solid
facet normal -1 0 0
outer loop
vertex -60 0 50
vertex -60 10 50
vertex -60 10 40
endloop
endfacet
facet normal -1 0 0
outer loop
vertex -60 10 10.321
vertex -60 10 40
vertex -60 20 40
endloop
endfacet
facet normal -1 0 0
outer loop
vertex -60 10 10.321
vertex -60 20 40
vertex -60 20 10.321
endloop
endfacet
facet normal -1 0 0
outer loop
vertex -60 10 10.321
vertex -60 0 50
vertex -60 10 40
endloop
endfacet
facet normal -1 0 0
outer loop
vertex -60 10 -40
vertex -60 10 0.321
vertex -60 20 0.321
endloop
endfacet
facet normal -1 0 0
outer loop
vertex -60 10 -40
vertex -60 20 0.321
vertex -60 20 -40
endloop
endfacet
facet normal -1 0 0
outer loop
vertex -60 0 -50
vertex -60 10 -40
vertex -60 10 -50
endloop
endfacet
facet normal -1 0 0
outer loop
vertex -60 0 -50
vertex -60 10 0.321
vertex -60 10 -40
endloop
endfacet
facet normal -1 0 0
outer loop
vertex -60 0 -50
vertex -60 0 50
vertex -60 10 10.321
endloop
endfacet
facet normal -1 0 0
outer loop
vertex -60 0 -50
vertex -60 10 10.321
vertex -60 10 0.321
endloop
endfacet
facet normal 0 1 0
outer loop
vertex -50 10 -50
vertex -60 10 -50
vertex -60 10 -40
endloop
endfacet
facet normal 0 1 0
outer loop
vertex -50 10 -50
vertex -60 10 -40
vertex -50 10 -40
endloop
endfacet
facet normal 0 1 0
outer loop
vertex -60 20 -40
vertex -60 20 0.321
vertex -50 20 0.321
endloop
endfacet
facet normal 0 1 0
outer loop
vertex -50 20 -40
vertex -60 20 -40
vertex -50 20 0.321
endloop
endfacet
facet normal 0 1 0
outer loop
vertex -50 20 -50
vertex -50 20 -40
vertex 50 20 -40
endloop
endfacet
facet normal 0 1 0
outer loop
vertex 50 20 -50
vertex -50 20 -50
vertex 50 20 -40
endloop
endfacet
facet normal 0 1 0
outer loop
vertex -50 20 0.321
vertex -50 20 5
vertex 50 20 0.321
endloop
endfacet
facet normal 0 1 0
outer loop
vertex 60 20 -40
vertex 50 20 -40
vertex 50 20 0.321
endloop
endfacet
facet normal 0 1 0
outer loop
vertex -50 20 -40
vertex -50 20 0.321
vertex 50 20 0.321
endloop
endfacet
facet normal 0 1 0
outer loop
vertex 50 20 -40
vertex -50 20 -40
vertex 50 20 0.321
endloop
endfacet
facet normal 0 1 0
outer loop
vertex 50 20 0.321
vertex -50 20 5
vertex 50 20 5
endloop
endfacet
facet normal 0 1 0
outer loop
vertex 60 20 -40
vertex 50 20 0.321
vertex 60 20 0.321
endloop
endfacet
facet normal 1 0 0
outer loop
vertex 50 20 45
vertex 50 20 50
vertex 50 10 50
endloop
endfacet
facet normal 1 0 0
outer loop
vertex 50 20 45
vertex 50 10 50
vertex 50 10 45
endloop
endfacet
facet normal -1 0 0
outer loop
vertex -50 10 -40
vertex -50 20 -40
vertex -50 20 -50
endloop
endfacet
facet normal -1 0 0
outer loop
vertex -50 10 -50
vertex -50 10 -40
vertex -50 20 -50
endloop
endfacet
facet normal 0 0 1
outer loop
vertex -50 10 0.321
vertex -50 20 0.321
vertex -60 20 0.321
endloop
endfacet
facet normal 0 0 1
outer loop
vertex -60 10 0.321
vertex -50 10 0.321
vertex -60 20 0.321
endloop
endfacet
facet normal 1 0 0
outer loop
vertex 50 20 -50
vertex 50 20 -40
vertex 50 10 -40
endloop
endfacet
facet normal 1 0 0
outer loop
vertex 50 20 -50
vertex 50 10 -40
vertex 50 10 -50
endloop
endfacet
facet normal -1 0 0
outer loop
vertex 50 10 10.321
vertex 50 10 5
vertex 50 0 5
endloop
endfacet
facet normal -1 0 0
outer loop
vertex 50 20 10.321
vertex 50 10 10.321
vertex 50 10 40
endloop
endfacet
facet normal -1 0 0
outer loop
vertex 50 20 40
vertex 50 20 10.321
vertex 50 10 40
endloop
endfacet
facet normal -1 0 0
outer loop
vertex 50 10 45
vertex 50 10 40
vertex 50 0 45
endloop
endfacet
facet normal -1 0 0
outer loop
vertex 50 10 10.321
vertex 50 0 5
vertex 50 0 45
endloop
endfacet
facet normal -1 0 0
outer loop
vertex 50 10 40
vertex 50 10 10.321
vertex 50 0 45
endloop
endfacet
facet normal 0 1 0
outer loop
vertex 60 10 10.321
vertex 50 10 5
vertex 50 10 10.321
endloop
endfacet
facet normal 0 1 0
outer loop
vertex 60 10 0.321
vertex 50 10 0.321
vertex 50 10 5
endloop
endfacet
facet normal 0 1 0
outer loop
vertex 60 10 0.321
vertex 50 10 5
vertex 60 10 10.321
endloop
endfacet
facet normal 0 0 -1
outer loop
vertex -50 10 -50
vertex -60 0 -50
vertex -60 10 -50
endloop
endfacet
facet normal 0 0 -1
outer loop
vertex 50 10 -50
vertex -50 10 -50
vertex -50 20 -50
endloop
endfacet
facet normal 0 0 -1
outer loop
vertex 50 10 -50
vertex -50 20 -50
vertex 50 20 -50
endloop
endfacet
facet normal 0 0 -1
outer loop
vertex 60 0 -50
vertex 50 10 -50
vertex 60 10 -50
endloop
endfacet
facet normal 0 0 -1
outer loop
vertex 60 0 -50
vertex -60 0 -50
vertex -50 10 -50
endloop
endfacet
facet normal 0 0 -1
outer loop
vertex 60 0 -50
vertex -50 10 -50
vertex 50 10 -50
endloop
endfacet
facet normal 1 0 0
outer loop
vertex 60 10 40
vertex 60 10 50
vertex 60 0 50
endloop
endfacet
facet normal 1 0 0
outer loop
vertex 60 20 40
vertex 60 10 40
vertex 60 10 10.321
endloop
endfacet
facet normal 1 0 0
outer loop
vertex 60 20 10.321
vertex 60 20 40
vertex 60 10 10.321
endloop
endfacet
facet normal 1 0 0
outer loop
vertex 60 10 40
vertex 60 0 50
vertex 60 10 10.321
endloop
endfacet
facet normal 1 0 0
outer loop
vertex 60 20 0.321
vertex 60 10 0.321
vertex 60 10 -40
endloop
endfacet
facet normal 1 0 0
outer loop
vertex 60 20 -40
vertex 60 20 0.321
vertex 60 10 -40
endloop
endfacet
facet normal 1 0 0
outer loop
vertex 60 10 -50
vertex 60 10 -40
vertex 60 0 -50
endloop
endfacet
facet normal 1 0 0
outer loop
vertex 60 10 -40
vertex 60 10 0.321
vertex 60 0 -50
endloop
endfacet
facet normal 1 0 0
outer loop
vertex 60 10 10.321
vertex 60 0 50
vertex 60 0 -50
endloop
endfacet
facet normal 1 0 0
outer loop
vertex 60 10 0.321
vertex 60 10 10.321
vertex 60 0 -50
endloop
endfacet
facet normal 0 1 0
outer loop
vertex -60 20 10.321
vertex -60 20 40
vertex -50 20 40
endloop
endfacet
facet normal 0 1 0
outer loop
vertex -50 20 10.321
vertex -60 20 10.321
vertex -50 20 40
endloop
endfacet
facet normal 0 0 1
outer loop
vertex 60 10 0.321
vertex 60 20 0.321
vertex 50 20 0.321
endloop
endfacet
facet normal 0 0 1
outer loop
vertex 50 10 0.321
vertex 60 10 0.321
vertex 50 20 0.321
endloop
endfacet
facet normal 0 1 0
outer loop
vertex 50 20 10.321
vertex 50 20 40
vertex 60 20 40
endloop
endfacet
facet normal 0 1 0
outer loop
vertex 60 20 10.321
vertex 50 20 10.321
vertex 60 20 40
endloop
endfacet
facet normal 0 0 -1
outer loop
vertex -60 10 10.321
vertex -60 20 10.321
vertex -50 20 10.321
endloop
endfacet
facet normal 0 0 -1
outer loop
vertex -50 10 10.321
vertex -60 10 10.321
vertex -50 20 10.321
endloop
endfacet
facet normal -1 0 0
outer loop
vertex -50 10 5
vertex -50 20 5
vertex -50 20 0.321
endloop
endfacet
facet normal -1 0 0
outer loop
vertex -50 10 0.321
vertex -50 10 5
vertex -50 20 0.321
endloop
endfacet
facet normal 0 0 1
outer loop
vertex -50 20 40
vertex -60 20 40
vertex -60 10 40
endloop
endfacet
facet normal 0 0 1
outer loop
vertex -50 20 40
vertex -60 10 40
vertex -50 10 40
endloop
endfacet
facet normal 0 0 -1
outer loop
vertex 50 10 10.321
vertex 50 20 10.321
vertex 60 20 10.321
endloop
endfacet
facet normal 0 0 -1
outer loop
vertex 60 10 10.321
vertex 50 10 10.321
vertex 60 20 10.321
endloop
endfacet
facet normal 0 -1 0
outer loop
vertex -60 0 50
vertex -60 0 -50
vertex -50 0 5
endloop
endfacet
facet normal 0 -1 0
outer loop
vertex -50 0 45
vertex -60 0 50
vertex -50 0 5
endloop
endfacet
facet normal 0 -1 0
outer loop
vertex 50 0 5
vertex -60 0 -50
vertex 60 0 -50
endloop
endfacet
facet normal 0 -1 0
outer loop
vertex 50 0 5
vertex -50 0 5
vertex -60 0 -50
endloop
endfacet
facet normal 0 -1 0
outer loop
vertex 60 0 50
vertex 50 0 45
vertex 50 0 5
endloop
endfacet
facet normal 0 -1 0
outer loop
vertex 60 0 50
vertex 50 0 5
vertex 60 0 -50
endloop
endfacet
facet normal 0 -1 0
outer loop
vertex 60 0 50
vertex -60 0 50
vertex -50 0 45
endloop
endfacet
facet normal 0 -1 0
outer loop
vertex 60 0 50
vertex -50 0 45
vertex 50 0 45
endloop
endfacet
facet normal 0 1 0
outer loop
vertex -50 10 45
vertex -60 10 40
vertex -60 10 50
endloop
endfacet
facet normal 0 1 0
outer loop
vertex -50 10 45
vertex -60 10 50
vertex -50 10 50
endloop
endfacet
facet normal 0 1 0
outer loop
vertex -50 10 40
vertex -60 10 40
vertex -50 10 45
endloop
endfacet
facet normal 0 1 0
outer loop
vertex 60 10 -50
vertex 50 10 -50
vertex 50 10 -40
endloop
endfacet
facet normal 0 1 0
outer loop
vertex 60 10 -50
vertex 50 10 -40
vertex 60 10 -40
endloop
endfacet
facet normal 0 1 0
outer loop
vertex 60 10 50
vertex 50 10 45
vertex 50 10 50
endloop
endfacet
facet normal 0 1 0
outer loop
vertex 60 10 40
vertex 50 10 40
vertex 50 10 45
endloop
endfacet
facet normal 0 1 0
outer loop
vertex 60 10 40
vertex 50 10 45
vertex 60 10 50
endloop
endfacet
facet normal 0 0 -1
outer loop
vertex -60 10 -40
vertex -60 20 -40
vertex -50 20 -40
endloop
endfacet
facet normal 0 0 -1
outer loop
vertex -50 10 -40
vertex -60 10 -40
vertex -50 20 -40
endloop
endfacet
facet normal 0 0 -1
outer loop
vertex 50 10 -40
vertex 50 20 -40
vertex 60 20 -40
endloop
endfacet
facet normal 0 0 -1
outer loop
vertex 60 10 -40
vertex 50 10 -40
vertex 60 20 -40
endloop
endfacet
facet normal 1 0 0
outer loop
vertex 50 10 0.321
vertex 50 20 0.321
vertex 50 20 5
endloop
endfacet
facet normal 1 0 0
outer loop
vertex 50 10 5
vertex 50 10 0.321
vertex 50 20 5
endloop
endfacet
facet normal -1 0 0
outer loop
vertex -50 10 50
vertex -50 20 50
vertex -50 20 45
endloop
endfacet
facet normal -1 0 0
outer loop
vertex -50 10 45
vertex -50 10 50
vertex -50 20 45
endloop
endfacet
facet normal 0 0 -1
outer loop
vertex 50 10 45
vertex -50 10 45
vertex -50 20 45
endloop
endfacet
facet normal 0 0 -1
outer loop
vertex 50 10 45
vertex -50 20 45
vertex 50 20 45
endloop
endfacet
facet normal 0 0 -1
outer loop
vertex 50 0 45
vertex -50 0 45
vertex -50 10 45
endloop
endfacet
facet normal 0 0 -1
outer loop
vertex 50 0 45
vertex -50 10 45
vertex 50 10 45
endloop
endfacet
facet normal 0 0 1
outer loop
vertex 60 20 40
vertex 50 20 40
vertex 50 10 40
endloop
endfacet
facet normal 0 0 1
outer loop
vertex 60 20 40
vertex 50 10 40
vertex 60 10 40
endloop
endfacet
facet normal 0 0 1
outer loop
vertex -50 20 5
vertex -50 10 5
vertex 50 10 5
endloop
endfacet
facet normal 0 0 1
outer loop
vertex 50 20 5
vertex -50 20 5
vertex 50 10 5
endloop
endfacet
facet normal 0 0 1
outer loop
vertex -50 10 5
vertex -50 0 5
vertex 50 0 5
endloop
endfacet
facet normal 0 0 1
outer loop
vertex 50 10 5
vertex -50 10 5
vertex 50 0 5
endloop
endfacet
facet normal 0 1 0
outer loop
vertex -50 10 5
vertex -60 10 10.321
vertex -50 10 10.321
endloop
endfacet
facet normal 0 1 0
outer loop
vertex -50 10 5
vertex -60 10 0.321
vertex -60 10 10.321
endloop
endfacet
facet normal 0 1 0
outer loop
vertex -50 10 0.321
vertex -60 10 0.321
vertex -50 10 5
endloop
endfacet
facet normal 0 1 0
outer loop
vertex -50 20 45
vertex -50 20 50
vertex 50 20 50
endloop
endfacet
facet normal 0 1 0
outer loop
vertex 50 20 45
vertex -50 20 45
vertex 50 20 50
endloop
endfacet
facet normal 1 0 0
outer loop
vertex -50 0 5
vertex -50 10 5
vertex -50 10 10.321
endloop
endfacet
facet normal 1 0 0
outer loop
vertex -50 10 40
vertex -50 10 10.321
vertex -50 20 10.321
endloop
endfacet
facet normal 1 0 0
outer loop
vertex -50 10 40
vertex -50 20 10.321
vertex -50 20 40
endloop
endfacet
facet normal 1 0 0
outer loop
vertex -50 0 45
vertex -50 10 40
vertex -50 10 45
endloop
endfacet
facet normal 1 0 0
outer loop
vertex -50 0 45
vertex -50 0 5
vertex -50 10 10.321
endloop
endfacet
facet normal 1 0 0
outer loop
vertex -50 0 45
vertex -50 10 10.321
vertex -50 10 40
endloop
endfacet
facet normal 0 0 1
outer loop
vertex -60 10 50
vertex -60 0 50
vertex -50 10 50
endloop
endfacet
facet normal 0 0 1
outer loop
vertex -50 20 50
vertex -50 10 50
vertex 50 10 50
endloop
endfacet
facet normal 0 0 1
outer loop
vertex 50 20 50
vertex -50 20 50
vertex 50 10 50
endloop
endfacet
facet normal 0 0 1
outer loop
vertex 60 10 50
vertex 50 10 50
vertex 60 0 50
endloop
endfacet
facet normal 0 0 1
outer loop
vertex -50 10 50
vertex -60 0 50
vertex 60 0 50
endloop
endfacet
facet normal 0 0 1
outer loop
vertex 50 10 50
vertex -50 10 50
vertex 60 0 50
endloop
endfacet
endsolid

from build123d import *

# Parameters (mm, degrees)
SKETCH1_W           = 120
SKETCH1_H           = 100
BOSS_EXTRUDE1_DEPTH = 20
SKETCH6_W           = 110
SKETCH6_H           = 40
CUT_EXTRUDE1_DEPTH  = 20
SKETCH6_3_W         = 5
SKETCH6_3_H         = 40
BOSS_EXTRUDE4_DEPTH = 20
SKETCH14_W          = 10
SKETCH14_H          = 10
CUT_EXTRUDE2_DEPTH  = 10
SKETCH15_W          = 10
SKETCH15_H          = 10
CUT_EXTRUDE3_DEPTH  = 10


with BuildPart() as part:
    # Sketch1 → Boss-Extrude1 (new body)
    with BuildSketch(Plane(origin=(0, 0, 0), x_dir=(1, 0, 0), z_dir=(0, 1, 0))):
        Rectangle(SKETCH1_W, SKETCH1_H)
    extrude(amount=BOSS_EXTRUDE1_DEPTH)

    # Sketch6 → Cut-Extrude1 (cut)
    with BuildSketch(Plane.XZ):
        with Locations((0, 25)):
            Rectangle(SKETCH6_W, SKETCH6_H)
    extrude(amount=-CUT_EXTRUDE1_DEPTH, mode=Mode.SUBTRACT)

    # Sketch6<3> → Boss-Extrude4 (add)
    with BuildSketch(Plane.XZ):
        with Locations((-52.5, 25)):
            Rectangle(SKETCH6_3_W, SKETCH6_3_H)
        with Locations((52.5, 25)):
            Rectangle(SKETCH6_3_W, SKETCH6_3_H)
    extrude(amount=-BOSS_EXTRUDE4_DEPTH)

    # Sketch14 → Cut-Extrude2 (cut)
    with BuildSketch(Plane(origin=(0, 20, 0), x_dir=(1, 0, 0), z_dir=(0, 1, 0))):
        with Locations((55, -5.320888862)):
            Rectangle(SKETCH14_W, SKETCH14_H)
        with Locations((-55, -5.320888862)):
            Rectangle(SKETCH14_W, SKETCH14_H)
    extrude(amount=-CUT_EXTRUDE2_DEPTH, mode=Mode.SUBTRACT)

    # Sketch15 → Cut-Extrude3 (cut)
    with BuildSketch(Plane(origin=(0, 20, 0), x_dir=(1, 0, 0), z_dir=(0, 1, 0))):
        with Locations((-55, 45)):
            Rectangle(SKETCH15_W, SKETCH15_H)
        with Locations((55, 45)):
            Rectangle(SKETCH15_W, SKETCH15_H)
        with Locations((55, -45)):
            Rectangle(SKETCH15_W, SKETCH15_H)
        with Locations((-55, -45)):
            Rectangle(SKETCH15_W, SKETCH15_H)
    extrude(amount=-CUT_EXTRUDE3_DEPTH, mode=Mode.SUBTRACT)


solid = part.part
